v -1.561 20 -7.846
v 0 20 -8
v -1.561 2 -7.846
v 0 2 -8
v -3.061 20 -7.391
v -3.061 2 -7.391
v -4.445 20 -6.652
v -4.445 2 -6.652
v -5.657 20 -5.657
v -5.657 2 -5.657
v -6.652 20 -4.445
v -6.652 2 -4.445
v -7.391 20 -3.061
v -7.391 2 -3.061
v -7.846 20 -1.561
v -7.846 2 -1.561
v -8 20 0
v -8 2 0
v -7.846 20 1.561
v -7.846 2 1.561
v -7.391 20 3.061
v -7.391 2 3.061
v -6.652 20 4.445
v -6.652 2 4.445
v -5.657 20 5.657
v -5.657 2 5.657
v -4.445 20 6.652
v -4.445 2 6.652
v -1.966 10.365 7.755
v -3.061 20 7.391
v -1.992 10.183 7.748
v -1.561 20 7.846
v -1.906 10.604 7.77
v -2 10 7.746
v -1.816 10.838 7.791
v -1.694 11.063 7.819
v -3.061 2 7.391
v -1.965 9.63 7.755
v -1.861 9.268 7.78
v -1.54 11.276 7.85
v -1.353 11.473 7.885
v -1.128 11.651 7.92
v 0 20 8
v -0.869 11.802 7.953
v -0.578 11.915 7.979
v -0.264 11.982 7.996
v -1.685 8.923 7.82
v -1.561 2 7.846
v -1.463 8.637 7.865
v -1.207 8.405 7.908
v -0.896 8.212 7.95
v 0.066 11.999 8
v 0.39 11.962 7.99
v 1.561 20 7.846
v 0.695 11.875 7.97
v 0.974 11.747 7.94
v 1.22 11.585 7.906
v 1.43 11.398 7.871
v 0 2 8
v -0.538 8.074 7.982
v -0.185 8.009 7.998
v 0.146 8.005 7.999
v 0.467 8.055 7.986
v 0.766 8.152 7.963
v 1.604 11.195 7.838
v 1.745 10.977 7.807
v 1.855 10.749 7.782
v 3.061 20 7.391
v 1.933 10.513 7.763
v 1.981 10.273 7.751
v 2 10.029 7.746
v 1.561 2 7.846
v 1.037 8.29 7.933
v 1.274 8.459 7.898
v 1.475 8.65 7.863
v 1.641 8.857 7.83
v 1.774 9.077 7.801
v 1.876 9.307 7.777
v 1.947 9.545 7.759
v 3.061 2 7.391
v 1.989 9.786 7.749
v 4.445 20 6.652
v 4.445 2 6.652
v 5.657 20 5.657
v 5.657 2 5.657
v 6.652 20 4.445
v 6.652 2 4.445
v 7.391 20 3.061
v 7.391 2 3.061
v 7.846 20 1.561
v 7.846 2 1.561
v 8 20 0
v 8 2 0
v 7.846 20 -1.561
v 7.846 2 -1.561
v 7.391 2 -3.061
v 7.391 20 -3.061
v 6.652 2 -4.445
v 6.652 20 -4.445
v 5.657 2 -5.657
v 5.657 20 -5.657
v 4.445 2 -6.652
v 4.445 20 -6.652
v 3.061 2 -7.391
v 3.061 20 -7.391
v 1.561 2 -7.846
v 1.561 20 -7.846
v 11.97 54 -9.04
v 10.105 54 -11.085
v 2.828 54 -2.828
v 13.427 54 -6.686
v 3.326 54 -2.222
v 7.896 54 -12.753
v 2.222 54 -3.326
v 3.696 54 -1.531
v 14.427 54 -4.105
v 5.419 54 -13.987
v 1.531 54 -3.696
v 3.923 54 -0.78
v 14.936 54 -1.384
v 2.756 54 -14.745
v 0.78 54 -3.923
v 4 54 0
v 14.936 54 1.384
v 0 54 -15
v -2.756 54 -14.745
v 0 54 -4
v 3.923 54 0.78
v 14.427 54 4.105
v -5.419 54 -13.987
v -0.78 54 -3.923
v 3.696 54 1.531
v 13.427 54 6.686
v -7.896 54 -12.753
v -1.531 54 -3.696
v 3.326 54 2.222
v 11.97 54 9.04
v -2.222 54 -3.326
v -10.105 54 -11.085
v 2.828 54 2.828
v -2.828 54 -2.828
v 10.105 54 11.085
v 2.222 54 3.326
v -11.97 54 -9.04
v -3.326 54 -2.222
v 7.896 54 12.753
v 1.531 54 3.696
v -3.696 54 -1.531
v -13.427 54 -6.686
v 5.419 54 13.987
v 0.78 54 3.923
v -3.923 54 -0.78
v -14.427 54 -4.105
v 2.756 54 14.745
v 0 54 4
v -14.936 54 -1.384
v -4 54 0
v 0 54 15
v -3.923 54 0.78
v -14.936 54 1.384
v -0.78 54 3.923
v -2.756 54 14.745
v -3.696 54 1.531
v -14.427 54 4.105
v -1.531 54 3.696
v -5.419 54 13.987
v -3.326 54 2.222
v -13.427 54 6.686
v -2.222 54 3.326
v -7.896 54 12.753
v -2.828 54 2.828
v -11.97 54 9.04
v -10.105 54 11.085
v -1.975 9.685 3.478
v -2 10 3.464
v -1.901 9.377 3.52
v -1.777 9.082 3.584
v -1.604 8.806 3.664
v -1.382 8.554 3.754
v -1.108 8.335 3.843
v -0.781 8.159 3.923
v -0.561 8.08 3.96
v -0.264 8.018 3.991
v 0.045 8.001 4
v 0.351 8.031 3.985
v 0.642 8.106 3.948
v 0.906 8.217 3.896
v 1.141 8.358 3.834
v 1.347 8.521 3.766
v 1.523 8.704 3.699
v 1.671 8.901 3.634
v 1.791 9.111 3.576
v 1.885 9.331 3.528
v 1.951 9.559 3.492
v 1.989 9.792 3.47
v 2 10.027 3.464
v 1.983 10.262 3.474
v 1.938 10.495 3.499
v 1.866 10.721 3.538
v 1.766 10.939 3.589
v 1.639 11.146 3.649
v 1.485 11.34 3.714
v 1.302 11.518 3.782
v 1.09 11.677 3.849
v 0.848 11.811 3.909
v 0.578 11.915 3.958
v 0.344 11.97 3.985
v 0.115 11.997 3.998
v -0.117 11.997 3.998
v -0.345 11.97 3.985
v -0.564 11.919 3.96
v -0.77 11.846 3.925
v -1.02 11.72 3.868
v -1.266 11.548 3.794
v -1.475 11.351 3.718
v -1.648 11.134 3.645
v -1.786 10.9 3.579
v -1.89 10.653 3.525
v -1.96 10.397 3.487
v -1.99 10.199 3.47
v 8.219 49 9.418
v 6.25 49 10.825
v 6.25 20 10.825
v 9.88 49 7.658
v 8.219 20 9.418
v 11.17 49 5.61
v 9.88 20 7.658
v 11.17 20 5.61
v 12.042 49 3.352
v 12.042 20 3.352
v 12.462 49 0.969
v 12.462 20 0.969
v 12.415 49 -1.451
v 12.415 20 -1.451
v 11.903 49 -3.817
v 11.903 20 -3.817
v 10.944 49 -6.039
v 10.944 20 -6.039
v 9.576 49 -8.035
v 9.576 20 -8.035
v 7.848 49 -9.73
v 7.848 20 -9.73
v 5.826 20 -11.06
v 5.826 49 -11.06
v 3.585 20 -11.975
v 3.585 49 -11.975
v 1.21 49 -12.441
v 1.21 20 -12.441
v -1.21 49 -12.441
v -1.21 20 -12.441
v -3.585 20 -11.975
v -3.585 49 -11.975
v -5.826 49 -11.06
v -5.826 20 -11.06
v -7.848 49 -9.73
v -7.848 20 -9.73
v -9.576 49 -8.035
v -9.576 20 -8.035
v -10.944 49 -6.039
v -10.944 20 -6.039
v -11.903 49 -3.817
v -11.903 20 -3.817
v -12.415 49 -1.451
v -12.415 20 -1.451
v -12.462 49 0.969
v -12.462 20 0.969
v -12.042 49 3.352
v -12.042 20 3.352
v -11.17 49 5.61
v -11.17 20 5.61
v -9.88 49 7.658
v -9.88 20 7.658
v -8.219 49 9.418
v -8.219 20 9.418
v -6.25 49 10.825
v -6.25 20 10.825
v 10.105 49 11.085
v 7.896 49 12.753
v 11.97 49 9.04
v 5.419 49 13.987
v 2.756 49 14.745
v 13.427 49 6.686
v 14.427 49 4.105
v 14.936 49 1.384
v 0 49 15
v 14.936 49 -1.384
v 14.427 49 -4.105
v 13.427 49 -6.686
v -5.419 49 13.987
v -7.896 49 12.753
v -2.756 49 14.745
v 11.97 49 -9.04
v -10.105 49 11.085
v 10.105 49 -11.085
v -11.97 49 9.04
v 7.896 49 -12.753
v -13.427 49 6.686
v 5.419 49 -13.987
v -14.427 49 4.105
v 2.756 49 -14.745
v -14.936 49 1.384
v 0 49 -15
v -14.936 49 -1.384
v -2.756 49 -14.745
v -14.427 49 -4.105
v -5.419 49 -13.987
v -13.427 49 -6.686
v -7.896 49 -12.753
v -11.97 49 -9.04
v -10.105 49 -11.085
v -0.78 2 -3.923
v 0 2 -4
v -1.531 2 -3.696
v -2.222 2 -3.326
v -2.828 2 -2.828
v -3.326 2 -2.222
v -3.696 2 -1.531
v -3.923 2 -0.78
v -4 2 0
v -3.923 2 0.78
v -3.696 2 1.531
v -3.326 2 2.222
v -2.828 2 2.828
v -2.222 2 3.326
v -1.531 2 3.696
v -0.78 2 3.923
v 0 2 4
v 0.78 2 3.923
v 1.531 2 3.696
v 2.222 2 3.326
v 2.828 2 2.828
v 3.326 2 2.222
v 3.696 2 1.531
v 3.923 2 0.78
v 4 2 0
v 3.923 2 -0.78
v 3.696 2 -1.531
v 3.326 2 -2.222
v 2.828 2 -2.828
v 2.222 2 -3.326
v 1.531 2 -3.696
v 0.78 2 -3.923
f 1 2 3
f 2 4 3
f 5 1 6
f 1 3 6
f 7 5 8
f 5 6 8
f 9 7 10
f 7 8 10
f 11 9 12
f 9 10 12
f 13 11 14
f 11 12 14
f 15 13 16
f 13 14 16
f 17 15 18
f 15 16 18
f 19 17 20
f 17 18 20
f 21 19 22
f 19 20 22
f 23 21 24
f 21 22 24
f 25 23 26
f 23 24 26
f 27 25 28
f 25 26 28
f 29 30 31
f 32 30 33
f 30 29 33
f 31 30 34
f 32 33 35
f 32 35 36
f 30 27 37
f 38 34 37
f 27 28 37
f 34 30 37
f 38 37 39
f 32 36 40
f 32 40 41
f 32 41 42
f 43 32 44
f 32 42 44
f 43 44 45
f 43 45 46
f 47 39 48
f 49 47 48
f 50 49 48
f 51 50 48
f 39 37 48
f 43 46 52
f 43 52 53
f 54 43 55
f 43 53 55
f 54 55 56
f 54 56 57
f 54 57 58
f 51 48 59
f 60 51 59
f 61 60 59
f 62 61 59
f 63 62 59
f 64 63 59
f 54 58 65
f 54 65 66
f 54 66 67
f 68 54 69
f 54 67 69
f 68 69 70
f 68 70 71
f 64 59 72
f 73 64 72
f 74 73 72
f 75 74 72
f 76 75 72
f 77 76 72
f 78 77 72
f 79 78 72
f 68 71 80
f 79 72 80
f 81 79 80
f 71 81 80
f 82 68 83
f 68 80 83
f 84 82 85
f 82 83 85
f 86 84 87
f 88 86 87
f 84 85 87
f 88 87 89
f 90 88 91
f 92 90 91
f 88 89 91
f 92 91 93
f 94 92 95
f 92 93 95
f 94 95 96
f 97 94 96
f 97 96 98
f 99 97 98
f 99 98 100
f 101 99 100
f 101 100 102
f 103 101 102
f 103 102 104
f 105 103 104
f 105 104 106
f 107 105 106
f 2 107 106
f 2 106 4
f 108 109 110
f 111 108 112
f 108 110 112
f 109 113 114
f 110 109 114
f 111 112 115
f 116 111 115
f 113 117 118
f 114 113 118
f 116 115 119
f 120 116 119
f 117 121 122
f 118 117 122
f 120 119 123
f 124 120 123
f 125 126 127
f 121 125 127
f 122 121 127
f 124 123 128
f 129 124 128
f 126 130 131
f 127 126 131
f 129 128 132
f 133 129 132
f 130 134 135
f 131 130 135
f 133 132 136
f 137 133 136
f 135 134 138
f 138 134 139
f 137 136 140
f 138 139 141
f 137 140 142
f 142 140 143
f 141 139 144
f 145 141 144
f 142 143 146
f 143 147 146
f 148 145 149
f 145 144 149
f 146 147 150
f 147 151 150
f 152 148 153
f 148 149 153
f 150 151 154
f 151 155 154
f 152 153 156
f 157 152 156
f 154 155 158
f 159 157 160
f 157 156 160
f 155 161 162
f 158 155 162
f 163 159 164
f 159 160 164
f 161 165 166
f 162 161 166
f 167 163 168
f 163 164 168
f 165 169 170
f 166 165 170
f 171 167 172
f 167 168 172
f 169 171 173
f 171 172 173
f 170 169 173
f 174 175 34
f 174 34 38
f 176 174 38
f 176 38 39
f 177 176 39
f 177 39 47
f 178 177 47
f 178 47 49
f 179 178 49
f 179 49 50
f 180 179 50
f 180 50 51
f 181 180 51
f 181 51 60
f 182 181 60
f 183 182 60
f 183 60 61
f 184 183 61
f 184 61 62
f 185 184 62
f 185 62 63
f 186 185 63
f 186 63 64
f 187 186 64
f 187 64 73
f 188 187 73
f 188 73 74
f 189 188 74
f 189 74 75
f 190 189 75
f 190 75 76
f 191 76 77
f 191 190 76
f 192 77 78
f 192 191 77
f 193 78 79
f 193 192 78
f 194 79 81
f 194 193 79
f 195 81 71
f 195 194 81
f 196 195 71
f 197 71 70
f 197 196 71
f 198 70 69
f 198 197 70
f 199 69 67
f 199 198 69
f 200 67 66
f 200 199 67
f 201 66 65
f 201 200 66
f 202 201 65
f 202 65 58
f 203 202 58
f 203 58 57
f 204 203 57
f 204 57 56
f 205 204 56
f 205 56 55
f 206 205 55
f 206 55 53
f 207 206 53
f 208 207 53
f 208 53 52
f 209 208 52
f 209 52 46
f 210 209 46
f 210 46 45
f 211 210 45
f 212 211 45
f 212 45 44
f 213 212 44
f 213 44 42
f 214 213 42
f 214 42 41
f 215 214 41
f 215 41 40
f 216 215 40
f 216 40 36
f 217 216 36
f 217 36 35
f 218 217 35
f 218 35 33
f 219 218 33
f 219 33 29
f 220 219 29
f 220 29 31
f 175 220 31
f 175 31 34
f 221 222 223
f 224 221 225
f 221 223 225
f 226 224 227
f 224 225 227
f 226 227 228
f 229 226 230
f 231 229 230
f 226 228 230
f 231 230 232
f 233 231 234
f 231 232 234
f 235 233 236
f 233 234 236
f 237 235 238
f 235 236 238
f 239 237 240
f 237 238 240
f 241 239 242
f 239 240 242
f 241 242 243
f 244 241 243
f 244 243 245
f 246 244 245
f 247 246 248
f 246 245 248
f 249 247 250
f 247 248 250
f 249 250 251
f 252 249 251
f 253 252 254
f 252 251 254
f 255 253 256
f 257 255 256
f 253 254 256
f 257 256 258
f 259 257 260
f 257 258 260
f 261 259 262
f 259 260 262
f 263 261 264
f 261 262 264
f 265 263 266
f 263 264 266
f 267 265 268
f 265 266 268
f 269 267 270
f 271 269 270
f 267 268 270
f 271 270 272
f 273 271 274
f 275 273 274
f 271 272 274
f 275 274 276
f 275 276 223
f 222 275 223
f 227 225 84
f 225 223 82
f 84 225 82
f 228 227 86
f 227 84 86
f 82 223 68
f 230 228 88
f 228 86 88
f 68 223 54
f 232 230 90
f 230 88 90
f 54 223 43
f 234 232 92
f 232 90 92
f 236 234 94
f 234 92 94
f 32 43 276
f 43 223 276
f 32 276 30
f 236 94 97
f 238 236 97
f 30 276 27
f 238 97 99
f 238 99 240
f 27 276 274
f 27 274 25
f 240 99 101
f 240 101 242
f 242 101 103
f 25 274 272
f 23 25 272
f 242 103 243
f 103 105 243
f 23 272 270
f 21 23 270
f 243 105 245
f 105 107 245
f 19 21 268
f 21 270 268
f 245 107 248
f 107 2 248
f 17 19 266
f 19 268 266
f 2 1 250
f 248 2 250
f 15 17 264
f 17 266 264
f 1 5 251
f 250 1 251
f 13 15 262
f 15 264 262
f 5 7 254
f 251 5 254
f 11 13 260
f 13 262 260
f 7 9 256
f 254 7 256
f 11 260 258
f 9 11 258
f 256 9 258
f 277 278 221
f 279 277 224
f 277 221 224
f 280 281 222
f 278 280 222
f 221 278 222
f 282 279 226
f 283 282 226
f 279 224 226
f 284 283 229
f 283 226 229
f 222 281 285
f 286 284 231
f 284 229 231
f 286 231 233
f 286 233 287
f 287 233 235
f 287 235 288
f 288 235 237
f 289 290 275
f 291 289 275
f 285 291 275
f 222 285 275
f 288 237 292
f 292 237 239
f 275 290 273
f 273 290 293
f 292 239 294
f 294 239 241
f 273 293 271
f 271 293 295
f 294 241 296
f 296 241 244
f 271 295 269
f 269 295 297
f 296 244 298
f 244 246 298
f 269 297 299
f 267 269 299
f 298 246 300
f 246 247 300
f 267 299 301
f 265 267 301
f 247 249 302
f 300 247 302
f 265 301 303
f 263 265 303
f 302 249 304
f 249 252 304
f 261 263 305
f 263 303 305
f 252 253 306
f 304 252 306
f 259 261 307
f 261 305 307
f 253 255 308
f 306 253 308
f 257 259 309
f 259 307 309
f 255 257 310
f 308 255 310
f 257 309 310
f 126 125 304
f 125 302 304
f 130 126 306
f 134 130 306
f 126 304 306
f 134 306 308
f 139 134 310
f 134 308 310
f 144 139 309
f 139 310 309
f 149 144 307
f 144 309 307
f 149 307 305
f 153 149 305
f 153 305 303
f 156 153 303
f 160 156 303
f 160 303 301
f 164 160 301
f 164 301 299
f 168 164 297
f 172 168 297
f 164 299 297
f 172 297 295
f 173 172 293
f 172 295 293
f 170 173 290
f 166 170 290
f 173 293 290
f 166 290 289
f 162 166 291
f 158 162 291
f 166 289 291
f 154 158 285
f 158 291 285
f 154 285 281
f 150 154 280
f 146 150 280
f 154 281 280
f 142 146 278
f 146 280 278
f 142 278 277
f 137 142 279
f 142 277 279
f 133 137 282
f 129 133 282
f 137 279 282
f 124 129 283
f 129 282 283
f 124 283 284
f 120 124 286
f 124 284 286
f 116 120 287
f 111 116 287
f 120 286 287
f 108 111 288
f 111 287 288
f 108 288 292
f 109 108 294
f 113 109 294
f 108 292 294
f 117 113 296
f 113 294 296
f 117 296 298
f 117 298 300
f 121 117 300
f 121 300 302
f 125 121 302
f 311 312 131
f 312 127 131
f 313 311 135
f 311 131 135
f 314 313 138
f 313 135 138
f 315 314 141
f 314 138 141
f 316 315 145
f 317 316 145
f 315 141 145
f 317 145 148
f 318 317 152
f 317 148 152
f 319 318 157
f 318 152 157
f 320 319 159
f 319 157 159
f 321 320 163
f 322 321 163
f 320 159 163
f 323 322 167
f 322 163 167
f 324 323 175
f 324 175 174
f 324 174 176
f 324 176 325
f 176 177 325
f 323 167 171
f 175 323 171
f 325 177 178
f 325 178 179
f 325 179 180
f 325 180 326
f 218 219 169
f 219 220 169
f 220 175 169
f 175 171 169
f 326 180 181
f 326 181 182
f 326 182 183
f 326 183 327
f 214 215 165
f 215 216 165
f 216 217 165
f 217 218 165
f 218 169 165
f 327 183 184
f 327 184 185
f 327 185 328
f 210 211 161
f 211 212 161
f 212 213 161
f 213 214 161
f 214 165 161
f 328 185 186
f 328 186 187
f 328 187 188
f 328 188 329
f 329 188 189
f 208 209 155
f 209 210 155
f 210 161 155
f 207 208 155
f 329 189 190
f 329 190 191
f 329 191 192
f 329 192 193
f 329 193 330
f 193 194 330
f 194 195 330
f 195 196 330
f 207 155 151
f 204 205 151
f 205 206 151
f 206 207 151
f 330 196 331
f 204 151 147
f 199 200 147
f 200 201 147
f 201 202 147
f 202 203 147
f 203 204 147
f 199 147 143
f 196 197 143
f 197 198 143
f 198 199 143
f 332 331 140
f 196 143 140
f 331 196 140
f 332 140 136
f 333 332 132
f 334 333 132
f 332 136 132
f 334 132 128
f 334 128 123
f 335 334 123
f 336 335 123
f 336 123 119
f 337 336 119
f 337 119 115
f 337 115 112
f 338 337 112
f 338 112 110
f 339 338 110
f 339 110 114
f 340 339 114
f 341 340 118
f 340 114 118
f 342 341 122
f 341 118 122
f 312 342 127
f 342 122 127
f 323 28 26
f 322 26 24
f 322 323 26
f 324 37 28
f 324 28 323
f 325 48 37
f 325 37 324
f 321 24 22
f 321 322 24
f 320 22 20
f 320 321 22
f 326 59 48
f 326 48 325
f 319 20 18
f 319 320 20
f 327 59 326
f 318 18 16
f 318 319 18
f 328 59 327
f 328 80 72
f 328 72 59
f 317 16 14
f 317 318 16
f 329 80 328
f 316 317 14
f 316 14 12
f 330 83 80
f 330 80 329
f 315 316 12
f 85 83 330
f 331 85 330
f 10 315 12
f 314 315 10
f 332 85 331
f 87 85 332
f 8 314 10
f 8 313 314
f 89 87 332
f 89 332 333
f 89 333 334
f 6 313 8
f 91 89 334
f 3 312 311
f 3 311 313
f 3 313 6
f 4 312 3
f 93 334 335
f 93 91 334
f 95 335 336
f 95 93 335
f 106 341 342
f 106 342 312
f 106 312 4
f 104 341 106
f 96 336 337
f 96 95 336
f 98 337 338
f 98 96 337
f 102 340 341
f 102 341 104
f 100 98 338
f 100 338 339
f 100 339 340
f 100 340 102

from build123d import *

# Parameters (mm, degrees)
SKETCH2_W               = 12.5
SKETCH2_H               = 2
CUT_EXTRUDE1_DEPTH      = 29
CUT_EXTRUDE2_REACH      = 60.017
CUT_EXTRUDE2_END_RADIUS = 8
SKETCH4_R               = 2
SKETCH5_R               = 8
CUT_EXTRUDE3_DEPTH      = 2


with BuildPart() as part:
    # Sketch1 → Revolve1 (revolve)
    with BuildSketch(Plane.XY, mode=Mode.PRIVATE) as revolve1_sk:
        Polygon((4, 0), (4, 54), (15, 54), (15, 49), (12.5, 49), (12.5, 20), (8, 20), (8, 0), align=None)
    revolve(revolve1_sk.sketch.rotate(Axis((0, 0, 0), (0, 1, 0)), 90), axis=Axis((0, 0, 0), (0, 1, 0)))

    # Sketch2 → Cut-Extrude1 (cut)
    with BuildSketch(Plane.XZ.offset(-20)):
        with Locations((0, 11.825317547)):
            Rectangle(SKETCH2_W, SKETCH2_H)
    extrude(amount=-CUT_EXTRUDE1_DEPTH, mode=Mode.SUBTRACT)

    # Cut-Extrude2: up to this cylinder (the profile starts inside it)
    cut_extrude2_end = Plane(origin=(0, 10, 0), z_dir=(0, -1, 0)) * Cylinder(CUT_EXTRUDE2_END_RADIUS, 137.034, mode=Mode.PRIVATE)
    # Sketch4 → Cut-Extrude2 (cut, up to the surface)
    with BuildSketch(Plane.XY, mode=Mode.PRIVATE) as cut_extrude2_sk1:
        with Locations(Location((0, 10, 0), (0, 0, 180))):
            Circle(SKETCH4_R)
    cut_extrude2_tool1 = extrude(cut_extrude2_sk1.sketch, amount=CUT_EXTRUDE2_REACH, mode=Mode.PRIVATE) & cut_extrude2_end
    add(cut_extrude2_tool1.solids().sort_by_distance((0, 10, 0))[0], mode=Mode.SUBTRACT)

    # Sketch5 → Cut-Extrude3 (cut)
    with BuildSketch(Plane.XZ):
        with Locations(Location((0, 0, 0), (0, 0, 270))):
            Circle(SKETCH5_R)
    extrude(amount=-CUT_EXTRUDE3_DEPTH, mode=Mode.SUBTRACT)


solid = part.part
